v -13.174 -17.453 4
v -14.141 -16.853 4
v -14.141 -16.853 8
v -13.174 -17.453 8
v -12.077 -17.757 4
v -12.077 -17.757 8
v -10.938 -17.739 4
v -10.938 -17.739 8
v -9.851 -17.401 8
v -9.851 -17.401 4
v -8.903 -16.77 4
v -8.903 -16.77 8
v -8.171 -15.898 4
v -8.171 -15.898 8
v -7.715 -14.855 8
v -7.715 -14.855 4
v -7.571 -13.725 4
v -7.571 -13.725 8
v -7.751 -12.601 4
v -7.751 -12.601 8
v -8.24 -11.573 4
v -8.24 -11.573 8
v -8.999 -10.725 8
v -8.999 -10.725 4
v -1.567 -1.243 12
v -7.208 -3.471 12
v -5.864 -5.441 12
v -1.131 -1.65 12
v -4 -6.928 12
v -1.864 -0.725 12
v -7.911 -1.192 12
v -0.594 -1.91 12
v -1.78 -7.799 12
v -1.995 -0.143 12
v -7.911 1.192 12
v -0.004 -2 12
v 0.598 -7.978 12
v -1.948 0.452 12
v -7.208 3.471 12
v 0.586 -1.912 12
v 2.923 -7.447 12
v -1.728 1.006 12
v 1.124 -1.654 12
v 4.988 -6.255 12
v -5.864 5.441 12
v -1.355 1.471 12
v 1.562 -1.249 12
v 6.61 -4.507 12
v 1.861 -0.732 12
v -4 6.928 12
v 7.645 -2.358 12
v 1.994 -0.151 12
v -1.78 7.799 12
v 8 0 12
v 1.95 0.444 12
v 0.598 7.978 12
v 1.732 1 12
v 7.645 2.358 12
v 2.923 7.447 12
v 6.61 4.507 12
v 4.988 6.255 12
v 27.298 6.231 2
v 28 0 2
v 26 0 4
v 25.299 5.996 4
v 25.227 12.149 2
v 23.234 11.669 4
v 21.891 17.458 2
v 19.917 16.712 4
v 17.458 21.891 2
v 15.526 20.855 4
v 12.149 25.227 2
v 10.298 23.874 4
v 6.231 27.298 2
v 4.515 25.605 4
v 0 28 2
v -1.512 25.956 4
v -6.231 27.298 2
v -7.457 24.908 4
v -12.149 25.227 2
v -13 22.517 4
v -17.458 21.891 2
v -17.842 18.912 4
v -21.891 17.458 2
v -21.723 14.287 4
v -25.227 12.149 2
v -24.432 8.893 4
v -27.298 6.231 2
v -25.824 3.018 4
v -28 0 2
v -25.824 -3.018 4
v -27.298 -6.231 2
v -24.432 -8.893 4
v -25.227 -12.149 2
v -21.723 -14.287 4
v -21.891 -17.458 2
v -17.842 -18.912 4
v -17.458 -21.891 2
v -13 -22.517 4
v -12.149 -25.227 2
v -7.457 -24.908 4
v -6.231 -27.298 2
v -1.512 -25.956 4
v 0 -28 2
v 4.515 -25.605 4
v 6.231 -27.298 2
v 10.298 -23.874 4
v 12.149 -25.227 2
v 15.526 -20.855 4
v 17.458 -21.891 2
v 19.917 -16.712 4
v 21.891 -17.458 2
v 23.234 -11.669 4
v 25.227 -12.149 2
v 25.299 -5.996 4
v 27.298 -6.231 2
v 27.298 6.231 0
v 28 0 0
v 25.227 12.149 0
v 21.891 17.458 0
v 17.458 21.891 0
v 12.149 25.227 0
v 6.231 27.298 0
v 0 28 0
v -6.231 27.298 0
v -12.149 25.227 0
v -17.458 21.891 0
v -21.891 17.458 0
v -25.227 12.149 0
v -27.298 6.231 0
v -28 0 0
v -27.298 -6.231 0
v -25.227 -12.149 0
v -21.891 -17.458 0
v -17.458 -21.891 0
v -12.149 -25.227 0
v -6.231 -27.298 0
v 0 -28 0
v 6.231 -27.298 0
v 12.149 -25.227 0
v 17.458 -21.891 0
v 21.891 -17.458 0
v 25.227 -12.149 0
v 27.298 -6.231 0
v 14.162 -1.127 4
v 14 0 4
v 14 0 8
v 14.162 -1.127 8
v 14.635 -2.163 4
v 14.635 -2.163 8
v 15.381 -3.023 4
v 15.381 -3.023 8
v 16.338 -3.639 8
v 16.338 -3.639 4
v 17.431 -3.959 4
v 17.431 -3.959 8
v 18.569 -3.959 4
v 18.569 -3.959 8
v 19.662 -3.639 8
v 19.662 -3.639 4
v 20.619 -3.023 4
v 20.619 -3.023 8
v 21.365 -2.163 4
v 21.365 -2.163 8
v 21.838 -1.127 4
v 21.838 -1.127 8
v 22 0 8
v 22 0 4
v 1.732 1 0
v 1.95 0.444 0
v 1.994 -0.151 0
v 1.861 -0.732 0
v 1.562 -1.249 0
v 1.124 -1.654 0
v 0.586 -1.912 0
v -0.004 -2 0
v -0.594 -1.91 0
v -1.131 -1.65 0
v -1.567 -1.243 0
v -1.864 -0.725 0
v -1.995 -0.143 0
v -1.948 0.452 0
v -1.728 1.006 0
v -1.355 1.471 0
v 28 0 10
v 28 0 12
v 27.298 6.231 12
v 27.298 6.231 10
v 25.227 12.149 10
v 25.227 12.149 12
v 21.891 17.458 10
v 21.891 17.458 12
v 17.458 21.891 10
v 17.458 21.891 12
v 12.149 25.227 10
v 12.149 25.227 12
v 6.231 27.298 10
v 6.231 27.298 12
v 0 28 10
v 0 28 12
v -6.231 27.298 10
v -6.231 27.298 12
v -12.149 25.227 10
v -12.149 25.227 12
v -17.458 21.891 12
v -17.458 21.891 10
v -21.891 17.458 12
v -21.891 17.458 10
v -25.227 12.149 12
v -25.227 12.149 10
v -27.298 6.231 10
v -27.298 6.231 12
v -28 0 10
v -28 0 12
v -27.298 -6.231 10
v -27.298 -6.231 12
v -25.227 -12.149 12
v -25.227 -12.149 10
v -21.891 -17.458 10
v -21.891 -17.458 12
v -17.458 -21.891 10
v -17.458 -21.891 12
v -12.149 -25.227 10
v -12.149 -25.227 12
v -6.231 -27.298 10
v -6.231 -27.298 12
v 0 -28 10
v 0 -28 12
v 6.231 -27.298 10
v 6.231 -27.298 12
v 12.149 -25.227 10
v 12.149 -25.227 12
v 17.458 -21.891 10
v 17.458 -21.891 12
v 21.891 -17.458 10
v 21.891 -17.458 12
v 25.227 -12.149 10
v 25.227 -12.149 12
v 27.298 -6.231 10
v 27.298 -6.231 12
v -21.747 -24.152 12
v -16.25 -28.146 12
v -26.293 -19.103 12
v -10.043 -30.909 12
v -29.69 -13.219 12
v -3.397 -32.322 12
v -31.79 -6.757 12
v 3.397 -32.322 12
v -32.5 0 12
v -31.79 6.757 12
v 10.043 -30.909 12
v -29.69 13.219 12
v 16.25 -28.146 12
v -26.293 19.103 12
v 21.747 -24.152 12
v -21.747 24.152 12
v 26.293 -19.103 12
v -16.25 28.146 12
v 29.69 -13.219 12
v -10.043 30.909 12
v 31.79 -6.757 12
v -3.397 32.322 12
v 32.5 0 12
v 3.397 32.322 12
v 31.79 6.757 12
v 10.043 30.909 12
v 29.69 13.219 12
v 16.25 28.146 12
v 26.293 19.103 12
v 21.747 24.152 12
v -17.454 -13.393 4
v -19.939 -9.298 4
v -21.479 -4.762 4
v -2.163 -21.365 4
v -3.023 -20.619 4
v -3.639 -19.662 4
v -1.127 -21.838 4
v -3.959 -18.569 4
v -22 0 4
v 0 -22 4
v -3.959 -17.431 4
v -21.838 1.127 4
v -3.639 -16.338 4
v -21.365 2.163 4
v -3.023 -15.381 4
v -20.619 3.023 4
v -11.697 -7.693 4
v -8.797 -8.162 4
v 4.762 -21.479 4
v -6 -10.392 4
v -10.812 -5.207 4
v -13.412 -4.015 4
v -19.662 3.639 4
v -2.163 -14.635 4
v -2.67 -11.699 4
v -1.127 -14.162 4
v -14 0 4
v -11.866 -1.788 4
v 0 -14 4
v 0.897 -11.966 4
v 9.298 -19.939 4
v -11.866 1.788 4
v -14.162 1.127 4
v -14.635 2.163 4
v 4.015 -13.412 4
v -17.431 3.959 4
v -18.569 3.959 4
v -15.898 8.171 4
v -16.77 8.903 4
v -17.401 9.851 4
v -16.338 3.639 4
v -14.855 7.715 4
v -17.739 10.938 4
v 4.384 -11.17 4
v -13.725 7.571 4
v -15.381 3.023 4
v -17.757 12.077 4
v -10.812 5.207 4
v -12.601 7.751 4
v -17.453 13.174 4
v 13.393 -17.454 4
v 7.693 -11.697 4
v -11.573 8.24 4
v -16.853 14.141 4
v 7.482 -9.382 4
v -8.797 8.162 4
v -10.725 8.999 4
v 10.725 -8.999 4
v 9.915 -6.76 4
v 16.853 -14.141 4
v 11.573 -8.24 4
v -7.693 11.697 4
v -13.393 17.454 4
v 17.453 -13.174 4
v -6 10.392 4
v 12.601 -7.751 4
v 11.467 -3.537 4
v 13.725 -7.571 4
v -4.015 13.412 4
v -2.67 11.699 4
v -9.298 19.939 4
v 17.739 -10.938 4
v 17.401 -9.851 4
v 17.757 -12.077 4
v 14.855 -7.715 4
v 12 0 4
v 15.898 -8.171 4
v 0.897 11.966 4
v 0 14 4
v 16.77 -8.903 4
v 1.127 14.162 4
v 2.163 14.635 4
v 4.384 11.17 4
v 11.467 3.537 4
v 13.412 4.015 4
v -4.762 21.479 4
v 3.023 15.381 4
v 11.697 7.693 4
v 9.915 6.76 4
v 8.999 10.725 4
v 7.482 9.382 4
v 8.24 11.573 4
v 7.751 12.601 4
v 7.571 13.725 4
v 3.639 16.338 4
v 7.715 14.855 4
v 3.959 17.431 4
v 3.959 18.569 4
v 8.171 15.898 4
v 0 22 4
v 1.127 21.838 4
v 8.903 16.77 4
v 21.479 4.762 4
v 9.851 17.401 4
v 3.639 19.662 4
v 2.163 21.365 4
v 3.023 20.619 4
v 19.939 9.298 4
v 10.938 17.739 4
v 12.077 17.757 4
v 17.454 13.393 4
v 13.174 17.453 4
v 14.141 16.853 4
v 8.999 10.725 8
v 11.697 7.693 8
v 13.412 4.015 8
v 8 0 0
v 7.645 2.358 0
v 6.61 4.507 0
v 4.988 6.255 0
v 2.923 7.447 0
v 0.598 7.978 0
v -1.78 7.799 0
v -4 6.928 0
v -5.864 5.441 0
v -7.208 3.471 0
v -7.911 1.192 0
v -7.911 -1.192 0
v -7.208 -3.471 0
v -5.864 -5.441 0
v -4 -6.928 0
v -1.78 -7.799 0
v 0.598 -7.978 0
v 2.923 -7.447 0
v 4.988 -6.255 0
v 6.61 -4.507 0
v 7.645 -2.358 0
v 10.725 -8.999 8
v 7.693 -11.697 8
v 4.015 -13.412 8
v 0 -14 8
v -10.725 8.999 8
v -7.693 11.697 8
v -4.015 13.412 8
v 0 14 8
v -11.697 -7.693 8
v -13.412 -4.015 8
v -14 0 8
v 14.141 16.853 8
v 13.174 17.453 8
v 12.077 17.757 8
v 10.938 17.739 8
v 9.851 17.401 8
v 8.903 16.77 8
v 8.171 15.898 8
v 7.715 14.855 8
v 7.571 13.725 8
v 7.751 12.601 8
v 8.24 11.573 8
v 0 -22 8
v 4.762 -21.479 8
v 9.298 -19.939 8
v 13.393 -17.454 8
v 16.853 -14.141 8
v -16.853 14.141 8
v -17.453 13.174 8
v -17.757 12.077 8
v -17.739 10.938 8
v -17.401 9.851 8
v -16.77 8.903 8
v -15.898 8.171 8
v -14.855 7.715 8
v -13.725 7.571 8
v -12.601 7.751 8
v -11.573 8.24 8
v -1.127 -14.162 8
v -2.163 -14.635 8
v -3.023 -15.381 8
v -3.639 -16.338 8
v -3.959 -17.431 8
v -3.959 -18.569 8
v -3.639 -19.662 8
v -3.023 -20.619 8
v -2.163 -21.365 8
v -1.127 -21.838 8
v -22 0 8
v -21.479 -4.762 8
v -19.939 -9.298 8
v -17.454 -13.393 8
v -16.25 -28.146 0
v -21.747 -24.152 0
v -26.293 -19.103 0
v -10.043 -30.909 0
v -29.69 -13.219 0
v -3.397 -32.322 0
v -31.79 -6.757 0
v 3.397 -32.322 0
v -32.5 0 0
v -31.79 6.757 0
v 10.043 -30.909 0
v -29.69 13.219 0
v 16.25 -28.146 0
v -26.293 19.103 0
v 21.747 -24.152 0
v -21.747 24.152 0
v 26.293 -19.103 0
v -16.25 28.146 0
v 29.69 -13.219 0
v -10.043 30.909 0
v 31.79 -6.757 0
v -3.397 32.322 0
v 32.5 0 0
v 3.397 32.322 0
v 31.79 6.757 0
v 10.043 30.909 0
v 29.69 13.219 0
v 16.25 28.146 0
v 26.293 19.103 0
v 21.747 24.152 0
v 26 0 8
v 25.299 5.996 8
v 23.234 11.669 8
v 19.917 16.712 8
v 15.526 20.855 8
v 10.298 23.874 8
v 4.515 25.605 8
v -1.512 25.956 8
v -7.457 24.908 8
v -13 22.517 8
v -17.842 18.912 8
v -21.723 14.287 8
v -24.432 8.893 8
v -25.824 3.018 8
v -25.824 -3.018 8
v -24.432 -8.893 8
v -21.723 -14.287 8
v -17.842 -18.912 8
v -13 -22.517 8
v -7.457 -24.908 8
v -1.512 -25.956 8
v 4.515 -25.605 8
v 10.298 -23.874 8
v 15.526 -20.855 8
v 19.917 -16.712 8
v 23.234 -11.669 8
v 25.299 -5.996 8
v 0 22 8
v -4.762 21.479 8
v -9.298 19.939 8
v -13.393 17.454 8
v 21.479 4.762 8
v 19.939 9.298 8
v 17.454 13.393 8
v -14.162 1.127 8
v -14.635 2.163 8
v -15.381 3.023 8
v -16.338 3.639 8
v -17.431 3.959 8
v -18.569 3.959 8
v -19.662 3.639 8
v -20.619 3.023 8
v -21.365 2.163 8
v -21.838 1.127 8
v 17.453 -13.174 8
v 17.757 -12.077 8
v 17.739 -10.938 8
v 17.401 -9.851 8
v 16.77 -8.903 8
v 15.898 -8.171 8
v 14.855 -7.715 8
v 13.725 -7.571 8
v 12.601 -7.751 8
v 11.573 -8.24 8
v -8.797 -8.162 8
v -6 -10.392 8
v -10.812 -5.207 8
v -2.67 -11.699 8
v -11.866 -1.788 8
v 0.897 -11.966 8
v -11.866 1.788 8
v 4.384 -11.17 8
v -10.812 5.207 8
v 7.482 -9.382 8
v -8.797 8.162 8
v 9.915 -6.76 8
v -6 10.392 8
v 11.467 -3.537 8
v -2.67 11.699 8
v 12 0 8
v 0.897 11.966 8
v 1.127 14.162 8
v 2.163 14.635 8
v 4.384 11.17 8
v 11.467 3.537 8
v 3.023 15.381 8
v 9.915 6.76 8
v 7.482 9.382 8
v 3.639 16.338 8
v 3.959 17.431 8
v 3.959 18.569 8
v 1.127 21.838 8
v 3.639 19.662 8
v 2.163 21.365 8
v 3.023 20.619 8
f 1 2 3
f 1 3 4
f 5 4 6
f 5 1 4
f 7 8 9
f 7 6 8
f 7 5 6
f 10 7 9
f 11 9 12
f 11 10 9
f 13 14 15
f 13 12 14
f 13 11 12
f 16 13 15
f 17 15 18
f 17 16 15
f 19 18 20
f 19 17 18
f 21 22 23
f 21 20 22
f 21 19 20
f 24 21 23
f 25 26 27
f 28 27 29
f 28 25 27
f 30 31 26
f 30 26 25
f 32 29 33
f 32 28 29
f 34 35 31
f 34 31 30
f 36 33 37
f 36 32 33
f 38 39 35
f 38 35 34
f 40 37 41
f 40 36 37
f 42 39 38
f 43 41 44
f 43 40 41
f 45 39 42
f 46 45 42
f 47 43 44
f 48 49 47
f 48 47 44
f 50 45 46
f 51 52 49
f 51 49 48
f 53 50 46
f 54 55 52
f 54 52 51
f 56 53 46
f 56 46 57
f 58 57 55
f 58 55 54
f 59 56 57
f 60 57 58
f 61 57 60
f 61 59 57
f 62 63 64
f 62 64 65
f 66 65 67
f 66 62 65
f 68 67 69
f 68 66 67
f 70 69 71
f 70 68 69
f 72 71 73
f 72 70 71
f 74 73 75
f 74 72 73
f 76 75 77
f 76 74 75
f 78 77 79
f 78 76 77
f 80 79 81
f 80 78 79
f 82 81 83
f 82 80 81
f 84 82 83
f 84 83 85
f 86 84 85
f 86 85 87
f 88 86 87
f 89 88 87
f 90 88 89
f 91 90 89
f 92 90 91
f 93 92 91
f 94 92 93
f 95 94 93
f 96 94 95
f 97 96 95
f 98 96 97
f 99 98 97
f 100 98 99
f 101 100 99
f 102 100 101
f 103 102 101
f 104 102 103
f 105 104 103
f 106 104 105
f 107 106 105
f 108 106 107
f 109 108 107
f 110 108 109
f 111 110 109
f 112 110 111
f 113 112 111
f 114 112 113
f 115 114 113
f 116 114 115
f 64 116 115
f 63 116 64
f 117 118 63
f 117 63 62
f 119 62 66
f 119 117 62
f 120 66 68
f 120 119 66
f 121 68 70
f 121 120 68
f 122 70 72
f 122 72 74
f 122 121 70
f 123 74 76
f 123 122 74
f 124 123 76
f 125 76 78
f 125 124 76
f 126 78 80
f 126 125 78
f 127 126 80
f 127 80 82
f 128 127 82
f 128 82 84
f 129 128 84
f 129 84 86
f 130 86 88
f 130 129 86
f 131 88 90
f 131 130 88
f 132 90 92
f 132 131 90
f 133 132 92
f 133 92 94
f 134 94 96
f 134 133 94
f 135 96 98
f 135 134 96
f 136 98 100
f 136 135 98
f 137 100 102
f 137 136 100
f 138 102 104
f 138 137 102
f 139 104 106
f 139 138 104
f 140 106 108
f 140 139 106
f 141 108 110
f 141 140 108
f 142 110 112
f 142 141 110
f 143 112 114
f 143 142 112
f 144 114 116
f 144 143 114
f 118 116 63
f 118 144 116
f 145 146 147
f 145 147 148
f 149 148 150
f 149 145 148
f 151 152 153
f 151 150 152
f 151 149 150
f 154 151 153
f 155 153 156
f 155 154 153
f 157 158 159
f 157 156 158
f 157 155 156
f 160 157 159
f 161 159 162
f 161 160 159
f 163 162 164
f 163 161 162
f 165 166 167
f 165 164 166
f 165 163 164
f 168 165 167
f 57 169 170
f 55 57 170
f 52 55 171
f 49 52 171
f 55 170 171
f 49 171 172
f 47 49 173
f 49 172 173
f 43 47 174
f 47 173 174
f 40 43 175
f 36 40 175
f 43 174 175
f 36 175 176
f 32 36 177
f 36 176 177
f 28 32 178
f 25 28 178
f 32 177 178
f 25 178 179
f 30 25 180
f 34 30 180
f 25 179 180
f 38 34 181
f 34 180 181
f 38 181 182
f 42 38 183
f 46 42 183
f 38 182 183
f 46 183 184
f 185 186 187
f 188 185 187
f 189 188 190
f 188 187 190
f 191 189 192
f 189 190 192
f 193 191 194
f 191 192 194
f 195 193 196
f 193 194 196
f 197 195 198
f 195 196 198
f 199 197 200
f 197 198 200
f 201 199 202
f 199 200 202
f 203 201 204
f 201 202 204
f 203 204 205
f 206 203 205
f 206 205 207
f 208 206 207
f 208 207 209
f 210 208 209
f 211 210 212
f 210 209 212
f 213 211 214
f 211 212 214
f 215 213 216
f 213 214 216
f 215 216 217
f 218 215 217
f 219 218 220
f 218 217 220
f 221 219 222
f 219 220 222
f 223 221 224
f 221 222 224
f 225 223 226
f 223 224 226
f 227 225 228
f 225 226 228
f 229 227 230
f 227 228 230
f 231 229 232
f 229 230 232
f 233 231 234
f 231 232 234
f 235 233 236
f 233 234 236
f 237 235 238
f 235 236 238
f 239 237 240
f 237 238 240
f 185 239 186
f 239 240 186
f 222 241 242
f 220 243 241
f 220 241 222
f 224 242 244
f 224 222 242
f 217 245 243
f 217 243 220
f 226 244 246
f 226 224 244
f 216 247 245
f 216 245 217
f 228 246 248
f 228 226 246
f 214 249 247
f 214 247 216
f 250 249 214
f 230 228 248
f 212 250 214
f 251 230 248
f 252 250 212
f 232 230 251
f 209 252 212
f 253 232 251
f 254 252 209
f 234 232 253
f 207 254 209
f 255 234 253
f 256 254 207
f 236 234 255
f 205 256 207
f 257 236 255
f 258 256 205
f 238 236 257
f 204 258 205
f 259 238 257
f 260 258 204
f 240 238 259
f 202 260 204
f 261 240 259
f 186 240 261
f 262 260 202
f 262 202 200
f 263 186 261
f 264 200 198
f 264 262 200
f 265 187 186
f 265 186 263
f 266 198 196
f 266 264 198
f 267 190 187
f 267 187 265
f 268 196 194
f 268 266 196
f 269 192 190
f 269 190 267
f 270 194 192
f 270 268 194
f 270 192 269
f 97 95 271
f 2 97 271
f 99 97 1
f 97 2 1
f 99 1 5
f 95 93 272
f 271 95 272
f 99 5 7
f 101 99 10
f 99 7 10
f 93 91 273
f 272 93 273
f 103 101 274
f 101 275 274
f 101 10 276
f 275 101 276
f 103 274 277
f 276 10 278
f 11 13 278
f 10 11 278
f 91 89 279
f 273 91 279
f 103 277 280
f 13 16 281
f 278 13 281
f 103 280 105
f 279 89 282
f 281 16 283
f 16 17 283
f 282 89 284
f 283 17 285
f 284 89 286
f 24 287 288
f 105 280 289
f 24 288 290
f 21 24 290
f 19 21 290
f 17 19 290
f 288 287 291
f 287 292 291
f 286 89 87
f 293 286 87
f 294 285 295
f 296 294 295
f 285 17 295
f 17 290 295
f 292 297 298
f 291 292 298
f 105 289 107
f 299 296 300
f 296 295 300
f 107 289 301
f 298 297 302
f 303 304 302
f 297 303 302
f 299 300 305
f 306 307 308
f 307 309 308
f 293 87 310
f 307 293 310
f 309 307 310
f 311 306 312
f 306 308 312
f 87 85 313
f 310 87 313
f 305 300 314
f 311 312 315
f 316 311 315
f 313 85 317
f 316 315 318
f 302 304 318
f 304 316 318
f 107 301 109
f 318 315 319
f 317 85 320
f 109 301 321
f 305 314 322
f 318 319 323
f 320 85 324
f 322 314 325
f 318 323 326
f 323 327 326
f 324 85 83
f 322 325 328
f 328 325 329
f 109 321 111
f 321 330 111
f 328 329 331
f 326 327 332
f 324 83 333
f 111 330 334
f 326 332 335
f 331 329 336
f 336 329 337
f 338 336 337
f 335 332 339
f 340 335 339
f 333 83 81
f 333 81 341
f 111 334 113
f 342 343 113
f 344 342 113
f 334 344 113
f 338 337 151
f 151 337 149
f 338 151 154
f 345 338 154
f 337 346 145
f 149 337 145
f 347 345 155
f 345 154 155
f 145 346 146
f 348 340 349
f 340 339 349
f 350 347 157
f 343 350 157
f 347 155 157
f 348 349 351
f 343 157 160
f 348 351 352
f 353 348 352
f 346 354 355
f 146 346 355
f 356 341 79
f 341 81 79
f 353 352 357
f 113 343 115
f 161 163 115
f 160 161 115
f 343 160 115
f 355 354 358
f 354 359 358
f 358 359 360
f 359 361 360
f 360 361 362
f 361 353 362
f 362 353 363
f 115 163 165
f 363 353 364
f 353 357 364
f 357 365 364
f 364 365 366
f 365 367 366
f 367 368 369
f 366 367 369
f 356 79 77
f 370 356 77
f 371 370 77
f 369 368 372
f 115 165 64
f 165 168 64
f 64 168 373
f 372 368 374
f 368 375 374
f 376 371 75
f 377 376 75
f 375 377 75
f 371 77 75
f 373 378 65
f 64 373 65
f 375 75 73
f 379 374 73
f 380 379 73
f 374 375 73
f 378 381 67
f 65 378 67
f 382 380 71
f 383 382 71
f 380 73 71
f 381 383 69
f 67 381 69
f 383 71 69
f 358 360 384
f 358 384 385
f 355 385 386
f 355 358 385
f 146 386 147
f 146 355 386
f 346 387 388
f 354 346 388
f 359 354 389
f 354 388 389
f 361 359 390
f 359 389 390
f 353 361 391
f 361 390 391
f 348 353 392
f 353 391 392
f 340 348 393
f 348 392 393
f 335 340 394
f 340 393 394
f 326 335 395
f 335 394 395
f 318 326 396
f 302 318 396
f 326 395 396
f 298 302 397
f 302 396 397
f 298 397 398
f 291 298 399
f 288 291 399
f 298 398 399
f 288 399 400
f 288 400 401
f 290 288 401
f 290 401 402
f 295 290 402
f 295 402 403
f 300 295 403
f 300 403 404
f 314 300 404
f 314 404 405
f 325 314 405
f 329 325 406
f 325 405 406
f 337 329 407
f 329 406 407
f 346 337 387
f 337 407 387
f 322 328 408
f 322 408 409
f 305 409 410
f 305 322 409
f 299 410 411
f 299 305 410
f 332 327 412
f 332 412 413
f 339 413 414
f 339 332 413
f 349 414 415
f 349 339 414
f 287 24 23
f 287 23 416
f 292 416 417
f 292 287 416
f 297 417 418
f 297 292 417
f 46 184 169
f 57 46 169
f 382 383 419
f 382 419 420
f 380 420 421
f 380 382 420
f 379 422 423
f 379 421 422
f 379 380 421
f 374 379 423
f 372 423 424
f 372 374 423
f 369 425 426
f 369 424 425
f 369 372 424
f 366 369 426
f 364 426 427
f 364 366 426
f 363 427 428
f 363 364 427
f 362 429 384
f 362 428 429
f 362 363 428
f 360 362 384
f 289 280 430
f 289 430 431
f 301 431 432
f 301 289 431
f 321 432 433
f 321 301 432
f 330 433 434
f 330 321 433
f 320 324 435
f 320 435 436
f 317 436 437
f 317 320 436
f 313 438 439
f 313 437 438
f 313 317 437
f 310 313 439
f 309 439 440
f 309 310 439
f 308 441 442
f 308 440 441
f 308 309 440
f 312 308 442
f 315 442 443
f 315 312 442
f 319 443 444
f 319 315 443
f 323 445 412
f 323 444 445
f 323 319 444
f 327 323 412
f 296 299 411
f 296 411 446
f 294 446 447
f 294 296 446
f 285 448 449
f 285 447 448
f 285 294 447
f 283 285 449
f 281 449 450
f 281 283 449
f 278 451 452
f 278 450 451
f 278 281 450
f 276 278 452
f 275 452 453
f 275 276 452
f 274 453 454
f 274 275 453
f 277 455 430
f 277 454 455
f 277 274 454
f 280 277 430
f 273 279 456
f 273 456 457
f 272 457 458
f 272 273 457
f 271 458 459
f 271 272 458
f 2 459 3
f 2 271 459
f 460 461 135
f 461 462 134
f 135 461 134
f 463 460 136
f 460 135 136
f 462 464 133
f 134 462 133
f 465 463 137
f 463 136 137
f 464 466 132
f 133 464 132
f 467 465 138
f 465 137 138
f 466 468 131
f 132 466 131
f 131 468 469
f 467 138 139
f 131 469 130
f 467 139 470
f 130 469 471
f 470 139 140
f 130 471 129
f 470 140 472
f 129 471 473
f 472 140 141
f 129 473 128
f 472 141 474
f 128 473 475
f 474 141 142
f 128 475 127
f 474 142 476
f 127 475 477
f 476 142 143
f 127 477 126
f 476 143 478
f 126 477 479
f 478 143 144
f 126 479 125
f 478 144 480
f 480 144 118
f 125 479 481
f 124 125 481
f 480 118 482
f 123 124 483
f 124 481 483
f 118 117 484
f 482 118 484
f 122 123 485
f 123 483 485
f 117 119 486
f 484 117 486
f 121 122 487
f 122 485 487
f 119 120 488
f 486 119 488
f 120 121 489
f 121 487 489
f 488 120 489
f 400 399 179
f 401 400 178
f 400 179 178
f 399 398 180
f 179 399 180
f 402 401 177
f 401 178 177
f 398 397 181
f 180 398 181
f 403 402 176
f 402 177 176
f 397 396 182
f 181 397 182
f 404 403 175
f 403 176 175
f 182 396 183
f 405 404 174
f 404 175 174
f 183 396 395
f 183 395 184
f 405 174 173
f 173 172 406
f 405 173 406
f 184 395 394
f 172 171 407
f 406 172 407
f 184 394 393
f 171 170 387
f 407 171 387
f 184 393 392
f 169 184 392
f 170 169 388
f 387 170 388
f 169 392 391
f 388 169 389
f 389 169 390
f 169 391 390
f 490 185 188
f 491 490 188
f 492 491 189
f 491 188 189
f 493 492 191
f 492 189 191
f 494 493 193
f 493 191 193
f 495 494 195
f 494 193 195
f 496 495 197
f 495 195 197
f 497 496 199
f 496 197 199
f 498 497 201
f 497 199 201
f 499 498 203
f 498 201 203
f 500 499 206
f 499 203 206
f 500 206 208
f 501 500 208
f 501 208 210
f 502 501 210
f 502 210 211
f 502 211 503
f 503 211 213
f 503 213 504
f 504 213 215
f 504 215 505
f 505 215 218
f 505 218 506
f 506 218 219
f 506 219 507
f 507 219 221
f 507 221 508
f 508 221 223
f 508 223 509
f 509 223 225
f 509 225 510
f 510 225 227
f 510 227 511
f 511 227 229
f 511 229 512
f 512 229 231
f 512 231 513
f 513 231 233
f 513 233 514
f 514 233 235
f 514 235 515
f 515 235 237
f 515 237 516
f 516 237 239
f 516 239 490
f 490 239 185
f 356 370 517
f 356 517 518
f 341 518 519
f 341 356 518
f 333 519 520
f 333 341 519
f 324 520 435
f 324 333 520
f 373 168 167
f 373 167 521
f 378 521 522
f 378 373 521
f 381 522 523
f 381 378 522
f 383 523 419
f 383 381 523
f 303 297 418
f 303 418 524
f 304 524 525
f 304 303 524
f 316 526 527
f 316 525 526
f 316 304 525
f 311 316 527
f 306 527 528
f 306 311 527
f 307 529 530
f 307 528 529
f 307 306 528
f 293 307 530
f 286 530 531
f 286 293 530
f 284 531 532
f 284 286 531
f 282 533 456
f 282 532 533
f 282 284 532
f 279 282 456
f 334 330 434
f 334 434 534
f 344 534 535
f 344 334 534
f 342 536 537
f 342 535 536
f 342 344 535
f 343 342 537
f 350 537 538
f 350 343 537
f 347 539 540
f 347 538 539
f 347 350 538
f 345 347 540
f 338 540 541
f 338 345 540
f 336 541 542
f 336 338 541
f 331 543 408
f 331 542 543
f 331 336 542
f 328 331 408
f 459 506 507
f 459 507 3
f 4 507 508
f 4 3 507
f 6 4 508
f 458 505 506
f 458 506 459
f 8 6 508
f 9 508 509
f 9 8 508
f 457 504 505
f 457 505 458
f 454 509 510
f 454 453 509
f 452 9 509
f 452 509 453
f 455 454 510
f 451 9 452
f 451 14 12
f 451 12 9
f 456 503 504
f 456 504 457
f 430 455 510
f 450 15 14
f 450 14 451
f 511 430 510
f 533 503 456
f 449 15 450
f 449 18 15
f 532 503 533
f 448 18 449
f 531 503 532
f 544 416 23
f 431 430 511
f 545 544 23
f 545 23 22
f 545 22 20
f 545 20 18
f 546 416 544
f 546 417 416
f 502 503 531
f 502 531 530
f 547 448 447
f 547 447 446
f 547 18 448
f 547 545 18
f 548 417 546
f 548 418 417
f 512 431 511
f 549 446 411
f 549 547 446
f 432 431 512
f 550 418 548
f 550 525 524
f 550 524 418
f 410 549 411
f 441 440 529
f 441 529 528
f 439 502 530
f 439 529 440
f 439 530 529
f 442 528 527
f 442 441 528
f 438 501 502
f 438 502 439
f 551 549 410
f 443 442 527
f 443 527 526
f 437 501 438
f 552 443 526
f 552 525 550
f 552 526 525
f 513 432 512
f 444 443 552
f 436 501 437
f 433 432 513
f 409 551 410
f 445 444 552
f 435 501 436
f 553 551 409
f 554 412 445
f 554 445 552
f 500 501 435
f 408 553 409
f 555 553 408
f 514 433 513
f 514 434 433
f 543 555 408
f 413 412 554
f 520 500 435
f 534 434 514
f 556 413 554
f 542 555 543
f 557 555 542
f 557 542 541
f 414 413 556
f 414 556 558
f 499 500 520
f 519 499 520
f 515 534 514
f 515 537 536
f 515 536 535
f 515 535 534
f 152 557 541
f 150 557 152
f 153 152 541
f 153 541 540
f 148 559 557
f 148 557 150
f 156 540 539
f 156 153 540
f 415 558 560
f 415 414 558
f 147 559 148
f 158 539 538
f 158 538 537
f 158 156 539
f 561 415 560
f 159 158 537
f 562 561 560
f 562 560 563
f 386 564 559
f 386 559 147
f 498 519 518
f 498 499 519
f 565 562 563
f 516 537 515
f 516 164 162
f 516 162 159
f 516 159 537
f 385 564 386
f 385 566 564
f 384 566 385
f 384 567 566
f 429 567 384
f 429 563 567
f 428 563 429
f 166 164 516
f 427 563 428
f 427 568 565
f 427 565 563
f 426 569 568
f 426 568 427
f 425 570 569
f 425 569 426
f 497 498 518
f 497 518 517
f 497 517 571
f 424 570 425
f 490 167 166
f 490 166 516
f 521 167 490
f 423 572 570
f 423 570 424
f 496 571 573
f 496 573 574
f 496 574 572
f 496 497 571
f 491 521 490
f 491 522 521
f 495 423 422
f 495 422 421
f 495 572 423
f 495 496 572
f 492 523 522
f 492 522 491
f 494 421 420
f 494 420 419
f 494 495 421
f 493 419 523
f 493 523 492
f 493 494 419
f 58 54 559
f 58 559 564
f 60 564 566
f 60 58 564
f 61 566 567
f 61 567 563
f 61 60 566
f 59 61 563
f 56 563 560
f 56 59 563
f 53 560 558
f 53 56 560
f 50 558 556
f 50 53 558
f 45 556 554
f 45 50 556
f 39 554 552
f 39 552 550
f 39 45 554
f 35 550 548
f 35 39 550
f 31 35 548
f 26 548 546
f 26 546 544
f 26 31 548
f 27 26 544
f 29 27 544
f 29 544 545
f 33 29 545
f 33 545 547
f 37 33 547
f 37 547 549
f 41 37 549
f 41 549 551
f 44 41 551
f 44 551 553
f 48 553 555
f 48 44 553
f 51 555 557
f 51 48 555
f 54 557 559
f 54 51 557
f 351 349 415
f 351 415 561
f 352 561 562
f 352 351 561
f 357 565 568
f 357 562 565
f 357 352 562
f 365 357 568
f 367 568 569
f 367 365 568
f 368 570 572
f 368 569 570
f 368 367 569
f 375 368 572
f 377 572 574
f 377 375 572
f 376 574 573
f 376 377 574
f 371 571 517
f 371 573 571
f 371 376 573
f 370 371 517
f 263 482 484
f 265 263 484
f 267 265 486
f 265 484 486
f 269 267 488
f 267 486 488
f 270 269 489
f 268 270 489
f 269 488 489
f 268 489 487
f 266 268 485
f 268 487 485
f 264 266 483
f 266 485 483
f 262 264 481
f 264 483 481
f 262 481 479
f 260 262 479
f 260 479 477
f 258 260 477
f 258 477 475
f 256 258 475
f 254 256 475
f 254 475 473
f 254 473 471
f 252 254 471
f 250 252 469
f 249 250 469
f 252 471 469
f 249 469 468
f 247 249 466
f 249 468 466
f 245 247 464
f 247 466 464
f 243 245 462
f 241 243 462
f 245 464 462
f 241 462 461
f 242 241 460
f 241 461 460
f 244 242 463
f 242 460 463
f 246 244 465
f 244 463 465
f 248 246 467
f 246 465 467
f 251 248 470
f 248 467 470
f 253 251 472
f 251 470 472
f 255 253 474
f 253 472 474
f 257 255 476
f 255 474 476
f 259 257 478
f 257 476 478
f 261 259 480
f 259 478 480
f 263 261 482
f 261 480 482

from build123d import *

# Parameters (mm, degrees)
ESQUISSE1_R                  = 32.5
BOSS_EXTRU_1_DEPTH           = 12
ESQUISSE2_R                  = 28
ESQUISSE2_R_2                = 8
ENL_V_MAT_EXTRU_1_DEPTH      = 4
CHANFREIN1_SIZE              = 4
CHANFREIN2_SIZE              = 2
CHANFREIN1_OF_SYM_TRIE1_SIZE = 4
CHANFREIN2_OF_SYM_TRIE1_SIZE = 2


with BuildPart() as part:
    # Esquisse1 → Boss.-Extru.1 (new body)
    with BuildSketch(Plane.XY):
        Circle(ESQUISSE1_R)
        with BuildLine():
            Line((-1.354529956, 1.471478372), (1.732143973, 0.999838616))
            ThreePointArc((1.732143973, 0.999838616), (-0.302091213, -1.97705359), (-1.354529956, 1.471478372))
        make_face(mode=Mode.SUBTRACT)
        with BuildLine():
            ThreePointArc((-10.724622204, 8.999026536), (-5.916655664, 12.688309019), (0, 14))
            ThreePointArc((0, 14), (4, 18), (0, 22))
            ThreePointArc((0, 22), (-9.297601758, 19.938771315), (-16.852977749, 14.141327413))
            ThreePointArc((-16.852977749, 14.141327413), (-16.359950415, 8.505999202), (-10.724622204, 8.999026536))
        make_face(mode=Mode.SUBTRACT)
        with BuildLine():
            ThreePointArc((22, 0), (19.938771315, 9.297601758), (14.141327413, 16.852977749))
            ThreePointArc((14.141327413, 16.852977749), (8.505999202, 16.359950415), (8.999026536, 10.724622204))
            ThreePointArc((8.999026536, 10.724622204), (12.688309019, 5.916655664), (14, 0))
            ThreePointArc((14, 0), (18, -4), (22, 0))
        make_face(mode=Mode.SUBTRACT)
        with BuildLine():
            ThreePointArc((0, -22), (9.297601758, -19.938771315), (16.852977749, -14.141327413))
            ThreePointArc((16.852977749, -14.141327413), (16.359950415, -8.505999202), (10.724622204, -8.999026536))
            ThreePointArc((10.724622204, -8.999026536), (5.916655664, -12.688309019), (0, -14))
            ThreePointArc((0, -14), (-4, -18), (0, -22))
        make_face(mode=Mode.SUBTRACT)
        with BuildLine():
            ThreePointArc((-22, 0), (-19.938771315, -9.297601758), (-14.141327413, -16.852977749))
            ThreePointArc((-14.141327413, -16.852977749), (-8.505999202, -16.359950415), (-8.999026536, -10.724622204))
            ThreePointArc((-8.999026536, -10.724622204), (-12.688309019, -5.916655664), (-14, 0))
            ThreePointArc((-14, 0), (-18, 4), (-22, 0))
        make_face(mode=Mode.SUBTRACT)
    extrude(amount=BOSS_EXTRU_1_DEPTH)

    # Esquisse2 → Enlèv. mat.-Extru.1 (cut)
    with BuildSketch(Plane.XY.offset(12)):
        Circle(ESQUISSE2_R)
        Circle(ESQUISSE2_R_2, mode=Mode.SUBTRACT)
    enl_v_mat_extru_1 = extrude(amount=-ENL_V_MAT_EXTRU_1_DEPTH, mode=Mode.SUBTRACT)

    # Chanfrein1
    chanfrein1_edges = [part.edges().sort_by_distance(p)[0] for p in [
        (-8, 0, 8),
    ]]
    chamfer(chanfrein1_edges, length=CHANFREIN1_SIZE - 0.0001)  # a hair under: the kernel refuses the full size

    # Chanfrein2
    chanfrein2_edges = [part.edges().sort_by_distance(p)[0] for p in [
        (-28, 0, 8),
    ]]
    chamfer(chanfrein2_edges, length=CHANFREIN2_SIZE)

    # Symétrie1: Enlèv. mat.-Extru.1 across plane
    add(enl_v_mat_extru_1.mirror(Plane.XY.offset(6)), mode=Mode.SUBTRACT)

    # Chanfrein1 of Symétrie1
    chanfrein1_of_sym_trie1_edges = [part.edges().sort_by_distance(p)[0] for p in [
        (-8, 0, 4),
    ]]
    chamfer(chanfrein1_of_sym_trie1_edges, length=CHANFREIN1_OF_SYM_TRIE1_SIZE - 0.0001)  # a hair under: the kernel refuses the full size

    # Chanfrein2 of Symétrie1
    chanfrein2_of_sym_trie1_edges = [part.edges().sort_by_distance(p)[0] for p in [
        (-28, 0, 4),
    ]]
    chamfer(chanfrein2_of_sym_trie1_edges, length=CHANFREIN2_OF_SYM_TRIE1_SIZE)


solid = part.part
